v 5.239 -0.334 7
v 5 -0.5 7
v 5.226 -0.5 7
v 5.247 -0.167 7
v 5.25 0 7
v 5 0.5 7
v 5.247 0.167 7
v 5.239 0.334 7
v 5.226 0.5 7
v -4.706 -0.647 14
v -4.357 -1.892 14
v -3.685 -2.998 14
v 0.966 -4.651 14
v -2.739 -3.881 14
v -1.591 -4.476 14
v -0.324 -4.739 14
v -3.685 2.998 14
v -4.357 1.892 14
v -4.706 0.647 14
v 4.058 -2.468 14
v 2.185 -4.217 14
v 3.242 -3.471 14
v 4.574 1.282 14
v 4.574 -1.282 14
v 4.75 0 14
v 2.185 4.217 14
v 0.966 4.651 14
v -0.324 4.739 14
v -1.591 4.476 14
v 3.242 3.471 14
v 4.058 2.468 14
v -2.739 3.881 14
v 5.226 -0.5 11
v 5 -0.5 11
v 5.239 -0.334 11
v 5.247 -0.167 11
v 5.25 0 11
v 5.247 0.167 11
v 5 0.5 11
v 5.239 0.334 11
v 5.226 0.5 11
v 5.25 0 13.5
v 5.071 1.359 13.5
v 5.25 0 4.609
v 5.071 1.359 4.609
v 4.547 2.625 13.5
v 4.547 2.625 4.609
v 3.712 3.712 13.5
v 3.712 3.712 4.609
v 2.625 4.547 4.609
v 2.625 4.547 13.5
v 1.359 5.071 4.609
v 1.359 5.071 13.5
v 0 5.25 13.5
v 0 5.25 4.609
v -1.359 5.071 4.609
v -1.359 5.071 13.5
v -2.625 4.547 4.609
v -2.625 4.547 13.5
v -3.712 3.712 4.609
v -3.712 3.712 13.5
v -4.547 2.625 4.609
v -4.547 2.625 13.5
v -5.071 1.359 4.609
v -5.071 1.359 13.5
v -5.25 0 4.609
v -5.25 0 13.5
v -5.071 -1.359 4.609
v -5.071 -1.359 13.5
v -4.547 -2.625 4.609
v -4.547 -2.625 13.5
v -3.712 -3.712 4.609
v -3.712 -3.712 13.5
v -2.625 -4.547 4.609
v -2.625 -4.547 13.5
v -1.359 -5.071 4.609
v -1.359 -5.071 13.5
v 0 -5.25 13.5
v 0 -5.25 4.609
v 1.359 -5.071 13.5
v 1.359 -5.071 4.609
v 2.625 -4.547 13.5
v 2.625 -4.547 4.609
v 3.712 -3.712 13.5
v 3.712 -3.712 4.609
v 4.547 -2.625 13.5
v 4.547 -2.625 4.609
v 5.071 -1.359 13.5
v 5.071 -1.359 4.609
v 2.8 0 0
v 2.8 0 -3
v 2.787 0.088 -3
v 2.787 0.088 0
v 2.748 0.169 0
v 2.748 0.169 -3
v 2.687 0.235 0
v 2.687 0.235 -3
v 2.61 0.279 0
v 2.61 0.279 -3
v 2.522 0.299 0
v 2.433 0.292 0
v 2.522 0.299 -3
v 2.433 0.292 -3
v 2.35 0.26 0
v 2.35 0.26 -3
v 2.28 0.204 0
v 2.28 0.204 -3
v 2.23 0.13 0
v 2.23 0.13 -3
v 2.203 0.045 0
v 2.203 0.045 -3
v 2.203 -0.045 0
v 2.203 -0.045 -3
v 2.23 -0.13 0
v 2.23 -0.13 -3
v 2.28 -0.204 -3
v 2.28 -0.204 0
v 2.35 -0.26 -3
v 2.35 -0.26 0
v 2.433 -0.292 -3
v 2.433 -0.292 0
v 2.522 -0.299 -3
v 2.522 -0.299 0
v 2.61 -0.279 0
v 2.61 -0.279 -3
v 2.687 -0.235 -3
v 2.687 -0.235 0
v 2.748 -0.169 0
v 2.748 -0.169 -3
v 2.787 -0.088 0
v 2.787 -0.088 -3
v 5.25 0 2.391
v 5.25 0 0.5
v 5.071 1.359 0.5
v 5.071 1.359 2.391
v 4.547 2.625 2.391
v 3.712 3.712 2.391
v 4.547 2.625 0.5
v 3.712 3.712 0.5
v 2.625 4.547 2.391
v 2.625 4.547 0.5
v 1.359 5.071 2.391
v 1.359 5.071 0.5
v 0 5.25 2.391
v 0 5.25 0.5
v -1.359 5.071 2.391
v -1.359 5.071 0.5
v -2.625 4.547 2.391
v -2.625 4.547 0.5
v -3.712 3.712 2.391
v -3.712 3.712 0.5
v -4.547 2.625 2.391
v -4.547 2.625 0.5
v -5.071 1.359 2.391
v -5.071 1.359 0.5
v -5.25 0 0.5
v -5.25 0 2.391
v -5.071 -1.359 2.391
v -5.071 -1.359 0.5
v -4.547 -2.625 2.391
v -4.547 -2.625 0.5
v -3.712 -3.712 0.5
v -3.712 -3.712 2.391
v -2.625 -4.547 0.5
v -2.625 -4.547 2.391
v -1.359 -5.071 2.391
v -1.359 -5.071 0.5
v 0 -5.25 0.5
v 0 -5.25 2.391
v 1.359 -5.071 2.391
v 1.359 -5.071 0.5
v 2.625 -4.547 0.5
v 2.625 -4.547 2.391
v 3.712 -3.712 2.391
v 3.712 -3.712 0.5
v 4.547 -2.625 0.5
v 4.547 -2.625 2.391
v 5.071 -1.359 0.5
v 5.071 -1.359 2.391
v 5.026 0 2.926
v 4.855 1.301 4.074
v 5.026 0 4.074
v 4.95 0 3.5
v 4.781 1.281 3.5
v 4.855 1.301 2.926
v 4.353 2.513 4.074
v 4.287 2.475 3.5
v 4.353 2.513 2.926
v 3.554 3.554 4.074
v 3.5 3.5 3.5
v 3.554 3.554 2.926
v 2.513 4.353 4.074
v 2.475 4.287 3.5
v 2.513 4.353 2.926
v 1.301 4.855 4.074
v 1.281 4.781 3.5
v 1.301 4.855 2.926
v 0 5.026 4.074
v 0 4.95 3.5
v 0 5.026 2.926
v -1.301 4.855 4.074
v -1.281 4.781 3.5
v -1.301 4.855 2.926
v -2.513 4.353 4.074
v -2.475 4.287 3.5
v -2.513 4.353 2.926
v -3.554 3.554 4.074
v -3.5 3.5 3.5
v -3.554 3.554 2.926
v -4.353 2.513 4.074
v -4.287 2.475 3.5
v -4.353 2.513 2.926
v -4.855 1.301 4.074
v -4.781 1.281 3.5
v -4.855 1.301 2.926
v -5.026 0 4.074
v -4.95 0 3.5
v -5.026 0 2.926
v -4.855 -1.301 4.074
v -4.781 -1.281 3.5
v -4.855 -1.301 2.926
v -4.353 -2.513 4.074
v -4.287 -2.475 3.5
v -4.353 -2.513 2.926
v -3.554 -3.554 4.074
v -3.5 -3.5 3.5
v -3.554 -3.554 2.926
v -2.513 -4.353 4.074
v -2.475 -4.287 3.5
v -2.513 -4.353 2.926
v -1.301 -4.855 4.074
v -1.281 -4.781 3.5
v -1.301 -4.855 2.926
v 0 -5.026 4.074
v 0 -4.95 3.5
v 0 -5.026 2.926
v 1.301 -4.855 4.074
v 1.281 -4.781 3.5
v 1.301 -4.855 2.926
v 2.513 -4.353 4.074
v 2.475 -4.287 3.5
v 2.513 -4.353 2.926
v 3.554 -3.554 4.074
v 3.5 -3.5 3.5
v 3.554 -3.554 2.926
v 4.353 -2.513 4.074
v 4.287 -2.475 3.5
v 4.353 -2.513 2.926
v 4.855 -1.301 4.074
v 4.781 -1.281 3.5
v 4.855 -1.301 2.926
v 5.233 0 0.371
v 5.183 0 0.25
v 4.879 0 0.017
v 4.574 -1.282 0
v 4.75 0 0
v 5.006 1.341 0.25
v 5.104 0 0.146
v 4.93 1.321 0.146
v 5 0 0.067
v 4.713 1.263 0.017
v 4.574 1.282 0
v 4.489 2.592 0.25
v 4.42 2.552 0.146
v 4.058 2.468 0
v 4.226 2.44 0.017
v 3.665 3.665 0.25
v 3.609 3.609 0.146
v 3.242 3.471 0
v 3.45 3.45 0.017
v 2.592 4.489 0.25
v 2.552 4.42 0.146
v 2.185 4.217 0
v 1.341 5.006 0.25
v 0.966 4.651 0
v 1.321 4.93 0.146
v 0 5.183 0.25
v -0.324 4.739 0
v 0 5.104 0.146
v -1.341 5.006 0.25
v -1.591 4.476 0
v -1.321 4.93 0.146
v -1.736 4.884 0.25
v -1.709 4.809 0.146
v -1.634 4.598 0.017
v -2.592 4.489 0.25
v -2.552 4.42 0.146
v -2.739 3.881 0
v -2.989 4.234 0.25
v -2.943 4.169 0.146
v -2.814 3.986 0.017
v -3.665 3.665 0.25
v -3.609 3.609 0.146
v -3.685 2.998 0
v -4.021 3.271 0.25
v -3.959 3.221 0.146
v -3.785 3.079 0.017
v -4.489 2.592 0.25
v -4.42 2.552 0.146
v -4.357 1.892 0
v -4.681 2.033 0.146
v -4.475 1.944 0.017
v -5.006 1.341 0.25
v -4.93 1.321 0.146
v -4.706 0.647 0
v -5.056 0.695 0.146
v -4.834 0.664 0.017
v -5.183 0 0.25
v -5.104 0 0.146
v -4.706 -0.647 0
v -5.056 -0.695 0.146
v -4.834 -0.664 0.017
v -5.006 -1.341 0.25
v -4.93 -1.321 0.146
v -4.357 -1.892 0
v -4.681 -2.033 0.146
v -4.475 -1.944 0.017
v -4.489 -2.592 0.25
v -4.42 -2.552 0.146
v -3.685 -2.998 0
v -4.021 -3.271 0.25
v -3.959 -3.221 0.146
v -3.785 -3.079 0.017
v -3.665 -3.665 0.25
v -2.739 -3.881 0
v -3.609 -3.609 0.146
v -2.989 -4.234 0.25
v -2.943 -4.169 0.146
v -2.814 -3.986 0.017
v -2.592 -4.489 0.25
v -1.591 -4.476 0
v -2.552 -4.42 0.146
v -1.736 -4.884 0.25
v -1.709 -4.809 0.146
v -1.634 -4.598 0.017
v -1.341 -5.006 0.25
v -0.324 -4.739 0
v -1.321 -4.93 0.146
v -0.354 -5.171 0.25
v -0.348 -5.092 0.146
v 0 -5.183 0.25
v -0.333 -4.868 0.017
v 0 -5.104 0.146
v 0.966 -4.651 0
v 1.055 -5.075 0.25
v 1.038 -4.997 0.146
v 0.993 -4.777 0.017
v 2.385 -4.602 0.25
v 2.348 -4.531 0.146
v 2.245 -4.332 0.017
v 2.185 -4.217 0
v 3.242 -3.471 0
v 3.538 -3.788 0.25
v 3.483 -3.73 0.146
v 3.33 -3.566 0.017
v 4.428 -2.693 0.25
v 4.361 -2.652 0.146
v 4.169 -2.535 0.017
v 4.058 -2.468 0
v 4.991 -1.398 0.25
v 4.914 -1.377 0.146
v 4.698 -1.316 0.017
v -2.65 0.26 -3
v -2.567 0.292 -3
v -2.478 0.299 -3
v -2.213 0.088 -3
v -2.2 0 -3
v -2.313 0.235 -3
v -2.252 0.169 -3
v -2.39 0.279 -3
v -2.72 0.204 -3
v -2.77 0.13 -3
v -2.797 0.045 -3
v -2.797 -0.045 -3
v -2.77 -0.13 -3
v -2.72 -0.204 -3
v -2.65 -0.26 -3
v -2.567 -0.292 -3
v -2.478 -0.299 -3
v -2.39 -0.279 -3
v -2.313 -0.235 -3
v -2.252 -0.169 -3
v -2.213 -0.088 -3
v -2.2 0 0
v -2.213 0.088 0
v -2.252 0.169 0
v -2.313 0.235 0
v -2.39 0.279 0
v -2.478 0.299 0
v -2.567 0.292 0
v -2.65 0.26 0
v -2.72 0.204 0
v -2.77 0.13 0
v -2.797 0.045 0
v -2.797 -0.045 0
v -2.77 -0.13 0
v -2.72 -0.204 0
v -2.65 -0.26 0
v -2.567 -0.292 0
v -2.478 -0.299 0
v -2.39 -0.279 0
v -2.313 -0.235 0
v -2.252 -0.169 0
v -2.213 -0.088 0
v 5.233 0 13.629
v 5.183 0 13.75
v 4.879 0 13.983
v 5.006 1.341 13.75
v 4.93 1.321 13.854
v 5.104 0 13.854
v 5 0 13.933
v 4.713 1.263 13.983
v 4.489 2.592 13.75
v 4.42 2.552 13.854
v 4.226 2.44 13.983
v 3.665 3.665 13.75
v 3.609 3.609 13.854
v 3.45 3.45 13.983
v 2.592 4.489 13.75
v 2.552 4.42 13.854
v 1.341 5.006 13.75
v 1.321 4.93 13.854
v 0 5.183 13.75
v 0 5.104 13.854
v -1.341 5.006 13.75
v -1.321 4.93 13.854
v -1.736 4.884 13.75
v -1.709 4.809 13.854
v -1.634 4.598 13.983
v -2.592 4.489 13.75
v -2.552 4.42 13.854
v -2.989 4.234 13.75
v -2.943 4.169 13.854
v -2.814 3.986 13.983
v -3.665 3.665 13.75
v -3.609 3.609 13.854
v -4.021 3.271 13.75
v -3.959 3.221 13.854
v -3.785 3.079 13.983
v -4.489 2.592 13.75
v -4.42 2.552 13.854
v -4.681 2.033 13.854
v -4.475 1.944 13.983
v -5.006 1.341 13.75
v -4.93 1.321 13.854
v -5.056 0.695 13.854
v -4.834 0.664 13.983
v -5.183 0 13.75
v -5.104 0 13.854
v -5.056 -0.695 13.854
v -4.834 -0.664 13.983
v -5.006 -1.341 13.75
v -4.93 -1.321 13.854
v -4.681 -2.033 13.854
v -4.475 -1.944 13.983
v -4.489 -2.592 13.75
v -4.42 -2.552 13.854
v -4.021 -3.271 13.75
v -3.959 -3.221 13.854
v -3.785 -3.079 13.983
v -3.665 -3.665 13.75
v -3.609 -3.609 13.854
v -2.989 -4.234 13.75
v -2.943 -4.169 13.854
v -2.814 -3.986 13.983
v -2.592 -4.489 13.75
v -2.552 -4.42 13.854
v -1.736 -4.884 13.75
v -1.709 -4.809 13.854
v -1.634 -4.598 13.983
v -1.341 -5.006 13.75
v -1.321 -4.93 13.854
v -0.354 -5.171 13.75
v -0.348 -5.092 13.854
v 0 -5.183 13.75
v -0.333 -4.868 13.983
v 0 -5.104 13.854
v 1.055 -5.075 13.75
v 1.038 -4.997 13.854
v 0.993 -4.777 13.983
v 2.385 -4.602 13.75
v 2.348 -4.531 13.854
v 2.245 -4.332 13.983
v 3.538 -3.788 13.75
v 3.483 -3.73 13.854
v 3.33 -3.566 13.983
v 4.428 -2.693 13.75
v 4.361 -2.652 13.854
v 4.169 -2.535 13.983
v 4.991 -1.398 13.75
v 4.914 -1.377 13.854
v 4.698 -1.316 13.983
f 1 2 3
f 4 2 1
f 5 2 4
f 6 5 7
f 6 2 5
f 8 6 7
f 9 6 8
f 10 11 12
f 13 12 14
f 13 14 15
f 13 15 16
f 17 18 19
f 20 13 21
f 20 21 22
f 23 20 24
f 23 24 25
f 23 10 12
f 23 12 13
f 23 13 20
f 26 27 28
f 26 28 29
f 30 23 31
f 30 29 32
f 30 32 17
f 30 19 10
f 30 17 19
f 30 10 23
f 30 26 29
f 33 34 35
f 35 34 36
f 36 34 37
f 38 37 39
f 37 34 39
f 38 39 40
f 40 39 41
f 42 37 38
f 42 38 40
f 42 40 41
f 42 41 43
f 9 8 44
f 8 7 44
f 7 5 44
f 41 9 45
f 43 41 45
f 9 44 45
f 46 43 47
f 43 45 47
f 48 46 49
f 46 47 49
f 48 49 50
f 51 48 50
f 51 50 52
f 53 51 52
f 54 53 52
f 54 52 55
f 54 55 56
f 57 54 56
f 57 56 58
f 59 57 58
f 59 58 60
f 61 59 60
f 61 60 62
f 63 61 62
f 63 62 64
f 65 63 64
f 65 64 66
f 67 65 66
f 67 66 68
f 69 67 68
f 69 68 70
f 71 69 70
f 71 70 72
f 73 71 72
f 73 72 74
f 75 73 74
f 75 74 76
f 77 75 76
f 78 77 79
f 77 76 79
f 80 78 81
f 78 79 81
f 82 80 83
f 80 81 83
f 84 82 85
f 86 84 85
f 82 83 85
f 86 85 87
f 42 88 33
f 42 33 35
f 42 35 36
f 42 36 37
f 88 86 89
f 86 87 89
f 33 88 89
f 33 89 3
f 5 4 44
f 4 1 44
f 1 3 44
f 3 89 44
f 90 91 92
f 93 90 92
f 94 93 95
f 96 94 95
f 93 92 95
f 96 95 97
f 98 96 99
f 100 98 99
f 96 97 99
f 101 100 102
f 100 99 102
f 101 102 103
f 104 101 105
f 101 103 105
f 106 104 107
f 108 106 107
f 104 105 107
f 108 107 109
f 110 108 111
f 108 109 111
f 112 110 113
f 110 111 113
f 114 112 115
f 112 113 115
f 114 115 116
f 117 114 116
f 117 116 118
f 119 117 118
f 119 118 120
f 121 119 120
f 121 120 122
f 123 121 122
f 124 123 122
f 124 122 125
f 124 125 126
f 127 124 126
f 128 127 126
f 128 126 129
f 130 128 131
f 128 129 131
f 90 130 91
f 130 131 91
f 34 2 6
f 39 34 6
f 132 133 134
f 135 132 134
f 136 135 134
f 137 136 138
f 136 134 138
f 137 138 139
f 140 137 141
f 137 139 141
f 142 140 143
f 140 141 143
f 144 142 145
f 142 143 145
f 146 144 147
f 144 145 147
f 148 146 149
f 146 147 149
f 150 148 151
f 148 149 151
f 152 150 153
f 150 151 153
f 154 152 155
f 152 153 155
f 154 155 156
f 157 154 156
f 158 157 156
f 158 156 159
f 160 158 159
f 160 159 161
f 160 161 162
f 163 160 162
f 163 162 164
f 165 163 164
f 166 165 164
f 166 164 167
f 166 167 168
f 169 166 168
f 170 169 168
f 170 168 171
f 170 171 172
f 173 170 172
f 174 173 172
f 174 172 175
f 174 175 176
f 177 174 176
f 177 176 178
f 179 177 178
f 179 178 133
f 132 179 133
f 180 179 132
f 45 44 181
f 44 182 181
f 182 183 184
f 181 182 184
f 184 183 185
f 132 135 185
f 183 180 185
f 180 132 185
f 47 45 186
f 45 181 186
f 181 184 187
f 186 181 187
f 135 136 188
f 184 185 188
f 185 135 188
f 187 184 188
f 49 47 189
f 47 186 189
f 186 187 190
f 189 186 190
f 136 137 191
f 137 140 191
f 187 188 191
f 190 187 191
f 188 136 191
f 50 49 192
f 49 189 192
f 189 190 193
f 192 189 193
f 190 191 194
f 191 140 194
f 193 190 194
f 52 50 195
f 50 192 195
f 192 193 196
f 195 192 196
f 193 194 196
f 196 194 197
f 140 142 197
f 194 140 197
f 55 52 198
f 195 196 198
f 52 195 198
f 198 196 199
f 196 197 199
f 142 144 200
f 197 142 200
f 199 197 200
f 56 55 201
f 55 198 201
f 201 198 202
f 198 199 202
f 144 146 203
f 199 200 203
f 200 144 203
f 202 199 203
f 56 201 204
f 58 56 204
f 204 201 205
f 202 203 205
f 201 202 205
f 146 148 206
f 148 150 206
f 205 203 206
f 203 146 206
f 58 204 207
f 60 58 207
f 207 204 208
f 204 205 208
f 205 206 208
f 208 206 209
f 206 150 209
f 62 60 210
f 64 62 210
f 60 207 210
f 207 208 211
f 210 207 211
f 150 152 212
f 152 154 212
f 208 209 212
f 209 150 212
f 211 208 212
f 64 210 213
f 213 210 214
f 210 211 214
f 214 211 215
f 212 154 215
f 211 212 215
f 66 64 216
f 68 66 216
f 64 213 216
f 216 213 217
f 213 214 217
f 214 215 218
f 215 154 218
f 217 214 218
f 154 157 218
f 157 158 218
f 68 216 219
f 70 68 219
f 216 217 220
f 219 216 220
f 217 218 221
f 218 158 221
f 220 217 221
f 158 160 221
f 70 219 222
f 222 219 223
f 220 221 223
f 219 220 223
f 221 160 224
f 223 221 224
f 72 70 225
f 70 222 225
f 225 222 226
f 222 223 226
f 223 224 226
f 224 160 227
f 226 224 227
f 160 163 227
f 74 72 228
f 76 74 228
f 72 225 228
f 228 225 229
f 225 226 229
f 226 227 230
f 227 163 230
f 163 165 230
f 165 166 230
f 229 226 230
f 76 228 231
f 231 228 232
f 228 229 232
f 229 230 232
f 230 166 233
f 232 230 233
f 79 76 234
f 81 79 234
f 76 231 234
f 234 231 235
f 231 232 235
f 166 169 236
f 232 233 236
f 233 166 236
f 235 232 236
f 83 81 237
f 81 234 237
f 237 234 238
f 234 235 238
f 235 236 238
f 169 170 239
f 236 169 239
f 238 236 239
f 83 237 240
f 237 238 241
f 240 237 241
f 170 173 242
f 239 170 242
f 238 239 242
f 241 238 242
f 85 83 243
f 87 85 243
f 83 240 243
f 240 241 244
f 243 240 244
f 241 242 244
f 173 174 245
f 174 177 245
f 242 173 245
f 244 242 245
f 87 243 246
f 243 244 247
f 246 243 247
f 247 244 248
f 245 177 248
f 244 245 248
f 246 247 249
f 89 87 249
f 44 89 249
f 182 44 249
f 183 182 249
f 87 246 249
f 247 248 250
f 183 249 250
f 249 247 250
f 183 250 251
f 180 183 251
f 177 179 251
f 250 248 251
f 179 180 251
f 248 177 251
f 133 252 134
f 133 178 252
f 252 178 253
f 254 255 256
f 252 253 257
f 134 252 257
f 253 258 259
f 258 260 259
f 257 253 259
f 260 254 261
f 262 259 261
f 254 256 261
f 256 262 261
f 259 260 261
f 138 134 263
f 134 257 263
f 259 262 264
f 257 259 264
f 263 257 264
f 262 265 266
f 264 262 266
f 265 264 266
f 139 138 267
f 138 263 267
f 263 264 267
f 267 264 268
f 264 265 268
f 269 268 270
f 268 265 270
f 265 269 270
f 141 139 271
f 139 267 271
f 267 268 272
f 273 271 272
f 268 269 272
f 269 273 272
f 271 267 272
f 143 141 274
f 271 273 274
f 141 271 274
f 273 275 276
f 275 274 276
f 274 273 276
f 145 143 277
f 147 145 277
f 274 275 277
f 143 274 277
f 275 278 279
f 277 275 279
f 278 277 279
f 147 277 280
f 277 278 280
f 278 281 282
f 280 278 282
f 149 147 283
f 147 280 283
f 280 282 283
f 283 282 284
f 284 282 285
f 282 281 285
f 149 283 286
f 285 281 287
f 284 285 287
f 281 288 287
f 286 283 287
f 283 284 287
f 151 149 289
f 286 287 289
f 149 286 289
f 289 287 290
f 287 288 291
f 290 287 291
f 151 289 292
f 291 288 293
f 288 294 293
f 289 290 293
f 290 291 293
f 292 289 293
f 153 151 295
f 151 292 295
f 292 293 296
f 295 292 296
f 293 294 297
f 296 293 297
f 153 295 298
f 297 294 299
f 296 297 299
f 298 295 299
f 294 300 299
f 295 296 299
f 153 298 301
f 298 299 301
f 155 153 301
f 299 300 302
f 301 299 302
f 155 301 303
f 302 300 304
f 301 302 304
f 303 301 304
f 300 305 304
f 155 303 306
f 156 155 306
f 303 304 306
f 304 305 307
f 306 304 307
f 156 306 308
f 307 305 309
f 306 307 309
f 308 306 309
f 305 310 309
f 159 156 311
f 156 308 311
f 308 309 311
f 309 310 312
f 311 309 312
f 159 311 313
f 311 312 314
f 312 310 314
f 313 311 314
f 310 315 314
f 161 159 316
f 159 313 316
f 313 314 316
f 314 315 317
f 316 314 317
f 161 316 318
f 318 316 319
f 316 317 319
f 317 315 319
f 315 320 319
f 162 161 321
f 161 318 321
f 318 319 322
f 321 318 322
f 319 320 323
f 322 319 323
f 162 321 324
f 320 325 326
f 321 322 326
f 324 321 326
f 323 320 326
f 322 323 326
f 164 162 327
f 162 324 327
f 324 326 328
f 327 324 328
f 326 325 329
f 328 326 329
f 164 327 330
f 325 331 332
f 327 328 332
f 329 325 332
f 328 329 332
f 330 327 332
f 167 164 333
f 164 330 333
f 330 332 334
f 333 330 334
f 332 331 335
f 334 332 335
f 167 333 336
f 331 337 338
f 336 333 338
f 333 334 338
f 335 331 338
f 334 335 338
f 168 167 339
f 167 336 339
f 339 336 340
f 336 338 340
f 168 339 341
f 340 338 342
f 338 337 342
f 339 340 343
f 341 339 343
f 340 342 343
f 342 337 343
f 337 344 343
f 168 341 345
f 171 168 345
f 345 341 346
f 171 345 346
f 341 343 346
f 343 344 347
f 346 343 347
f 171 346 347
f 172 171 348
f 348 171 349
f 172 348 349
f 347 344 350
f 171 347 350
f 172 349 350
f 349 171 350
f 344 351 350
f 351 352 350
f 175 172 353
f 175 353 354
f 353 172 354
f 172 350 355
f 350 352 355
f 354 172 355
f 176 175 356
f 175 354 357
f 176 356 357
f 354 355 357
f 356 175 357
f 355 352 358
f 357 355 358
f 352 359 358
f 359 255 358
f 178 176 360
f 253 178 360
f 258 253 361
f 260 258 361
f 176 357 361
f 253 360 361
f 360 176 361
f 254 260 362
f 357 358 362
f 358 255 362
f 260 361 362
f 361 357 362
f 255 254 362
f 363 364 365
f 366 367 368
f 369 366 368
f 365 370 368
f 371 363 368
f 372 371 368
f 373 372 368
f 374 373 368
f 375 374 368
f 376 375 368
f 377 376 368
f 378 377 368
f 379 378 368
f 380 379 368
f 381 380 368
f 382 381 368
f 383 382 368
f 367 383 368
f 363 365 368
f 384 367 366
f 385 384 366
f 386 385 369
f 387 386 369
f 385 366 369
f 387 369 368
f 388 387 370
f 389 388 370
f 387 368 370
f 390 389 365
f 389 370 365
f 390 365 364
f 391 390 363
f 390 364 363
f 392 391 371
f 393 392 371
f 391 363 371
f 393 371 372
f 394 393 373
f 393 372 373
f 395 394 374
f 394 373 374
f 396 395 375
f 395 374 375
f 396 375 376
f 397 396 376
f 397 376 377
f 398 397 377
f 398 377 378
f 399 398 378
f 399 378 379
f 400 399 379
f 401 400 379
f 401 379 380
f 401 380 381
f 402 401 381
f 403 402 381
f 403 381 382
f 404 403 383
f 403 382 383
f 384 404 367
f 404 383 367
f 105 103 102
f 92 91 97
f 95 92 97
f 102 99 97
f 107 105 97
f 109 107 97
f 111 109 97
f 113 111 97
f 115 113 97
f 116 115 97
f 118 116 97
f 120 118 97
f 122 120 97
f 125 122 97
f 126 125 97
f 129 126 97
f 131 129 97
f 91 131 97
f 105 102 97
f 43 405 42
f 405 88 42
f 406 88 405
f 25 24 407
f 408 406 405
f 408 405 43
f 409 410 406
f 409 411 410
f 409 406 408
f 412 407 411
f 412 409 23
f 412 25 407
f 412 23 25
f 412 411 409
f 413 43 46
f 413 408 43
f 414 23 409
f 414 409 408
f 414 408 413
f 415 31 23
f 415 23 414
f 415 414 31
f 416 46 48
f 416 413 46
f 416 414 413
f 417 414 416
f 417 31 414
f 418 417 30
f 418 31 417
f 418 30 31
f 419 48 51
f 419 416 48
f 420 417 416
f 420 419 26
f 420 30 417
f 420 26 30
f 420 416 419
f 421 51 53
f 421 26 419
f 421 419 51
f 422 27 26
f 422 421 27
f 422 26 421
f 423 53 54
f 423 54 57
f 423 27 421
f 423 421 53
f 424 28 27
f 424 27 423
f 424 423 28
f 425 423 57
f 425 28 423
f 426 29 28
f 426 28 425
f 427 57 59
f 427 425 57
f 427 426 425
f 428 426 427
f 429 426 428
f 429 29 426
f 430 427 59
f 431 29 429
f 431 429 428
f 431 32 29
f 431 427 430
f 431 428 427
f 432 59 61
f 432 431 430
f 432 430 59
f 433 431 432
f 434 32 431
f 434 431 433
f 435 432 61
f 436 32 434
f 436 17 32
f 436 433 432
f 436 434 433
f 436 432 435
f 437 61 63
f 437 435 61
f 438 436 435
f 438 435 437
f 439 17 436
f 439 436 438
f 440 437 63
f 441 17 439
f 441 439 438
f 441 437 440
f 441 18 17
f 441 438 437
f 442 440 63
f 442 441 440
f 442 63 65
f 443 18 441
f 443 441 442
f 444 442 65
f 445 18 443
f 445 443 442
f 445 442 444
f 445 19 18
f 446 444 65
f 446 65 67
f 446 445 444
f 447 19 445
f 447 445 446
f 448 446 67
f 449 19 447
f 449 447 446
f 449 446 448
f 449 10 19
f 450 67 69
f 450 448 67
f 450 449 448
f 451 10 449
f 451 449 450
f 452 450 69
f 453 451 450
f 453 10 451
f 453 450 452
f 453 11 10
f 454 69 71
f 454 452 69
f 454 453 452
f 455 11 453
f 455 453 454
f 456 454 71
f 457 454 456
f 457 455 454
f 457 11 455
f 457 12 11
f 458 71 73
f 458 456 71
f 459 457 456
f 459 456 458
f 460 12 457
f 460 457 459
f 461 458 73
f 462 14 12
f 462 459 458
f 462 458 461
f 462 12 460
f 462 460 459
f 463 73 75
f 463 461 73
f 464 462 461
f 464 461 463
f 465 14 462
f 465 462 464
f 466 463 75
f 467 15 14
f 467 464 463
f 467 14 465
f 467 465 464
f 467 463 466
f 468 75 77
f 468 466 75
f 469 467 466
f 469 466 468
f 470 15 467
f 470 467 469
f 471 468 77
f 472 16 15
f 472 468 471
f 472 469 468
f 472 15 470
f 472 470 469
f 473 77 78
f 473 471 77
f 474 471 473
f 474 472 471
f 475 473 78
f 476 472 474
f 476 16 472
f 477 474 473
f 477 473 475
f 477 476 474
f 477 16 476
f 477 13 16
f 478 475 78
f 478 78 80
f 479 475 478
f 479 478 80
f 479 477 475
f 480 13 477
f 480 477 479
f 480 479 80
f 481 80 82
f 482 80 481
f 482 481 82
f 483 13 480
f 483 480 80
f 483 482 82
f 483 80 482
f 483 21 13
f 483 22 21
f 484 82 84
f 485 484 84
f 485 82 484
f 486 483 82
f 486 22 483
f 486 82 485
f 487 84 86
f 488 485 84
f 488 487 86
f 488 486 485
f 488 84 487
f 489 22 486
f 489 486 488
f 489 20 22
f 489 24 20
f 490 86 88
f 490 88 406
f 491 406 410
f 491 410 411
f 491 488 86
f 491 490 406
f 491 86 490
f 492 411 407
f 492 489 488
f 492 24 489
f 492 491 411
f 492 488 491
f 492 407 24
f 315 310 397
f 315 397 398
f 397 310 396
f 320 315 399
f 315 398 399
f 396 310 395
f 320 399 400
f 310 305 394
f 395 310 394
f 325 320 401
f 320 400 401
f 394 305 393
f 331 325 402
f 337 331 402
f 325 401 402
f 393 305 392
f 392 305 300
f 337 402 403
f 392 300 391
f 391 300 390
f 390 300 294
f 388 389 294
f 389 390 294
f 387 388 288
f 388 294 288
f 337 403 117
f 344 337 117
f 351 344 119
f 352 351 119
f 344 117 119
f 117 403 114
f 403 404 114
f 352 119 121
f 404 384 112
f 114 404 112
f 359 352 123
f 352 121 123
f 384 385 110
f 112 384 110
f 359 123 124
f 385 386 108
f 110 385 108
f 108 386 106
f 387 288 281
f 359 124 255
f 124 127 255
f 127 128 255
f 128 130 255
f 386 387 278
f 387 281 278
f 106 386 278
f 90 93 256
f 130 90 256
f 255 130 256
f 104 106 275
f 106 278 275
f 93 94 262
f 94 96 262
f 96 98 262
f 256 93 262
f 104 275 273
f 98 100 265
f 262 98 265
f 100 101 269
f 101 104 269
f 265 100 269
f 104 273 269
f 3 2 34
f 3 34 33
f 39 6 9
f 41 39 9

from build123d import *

# Parameters (mm, degrees)
CYLINDER002_R     = 0.3
CYLINDER002_DEPTH = 3
CYLINDER001_R     = 0.3
CYLINDER001_DEPTH = 3
BOX001_W          = 1
BOX001_H          = 1
BOX001_DEPTH      = 4
BOX_W             = 1
BOX_H             = 1
BOX_DEPTH         = 4
TORUS_R           = 2.2
CYLINDER_R        = 5.25
CYLINDER_DEPTH    = 14
FILLET_R          = 0.5


with BuildPart() as pin2:
    # Cylinder002 → Cylinder002 (new body)
    with BuildSketch(Plane(origin=(2.5, 0, -3), x_dir=(1, 0, 0), z_dir=(0, 0, 1))):
        Circle(CYLINDER002_R)
    extrude(amount=CYLINDER002_DEPTH)


with BuildPart() as pin1:
    # Cylinder001 → Cylinder001 (new body)
    with BuildSketch(Plane(origin=(-2.5, 0, -3), x_dir=(1, 0, 0), z_dir=(0, 0, 1))):
        Circle(CYLINDER001_R)
    extrude(amount=CYLINDER001_DEPTH)


with BuildPart() as box001:
    # Box001 → Box001 (new body)
    with BuildSketch(Plane(origin=(5, -0.5, 15), x_dir=(1, 0, 0), z_dir=(0, 0, 1))):
        with Locations((0.5, 0.5)):
            Rectangle(BOX001_W, BOX001_H)
    extrude(amount=BOX001_DEPTH)


with BuildPart() as box:
    # Box → Box (new body)
    with BuildSketch(Plane(origin=(5, -0.5, 7), x_dir=(1, 0, 0), z_dir=(0, 0, 1))):
        with Locations((0.5, 0.5)):
            Rectangle(BOX_W, BOX_H)
    extrude(amount=BOX_DEPTH)


with BuildPart() as ring:
    # Torus → Torus (revolve)
    with BuildSketch(Plane(origin=(0, 0, 3.5), x_dir=(1, 0, 0), z_dir=(0, -1, 0))):
        with Locations((7.15, 0)):
            Circle(TORUS_R)
    revolve(axis=Axis((0, 0, 3.5), (0, 0, 1)))


with BuildPart() as cappr500w60d1000h1250:
    # Cylinder → Cylinder (new body)
    with BuildSketch(Plane.XY):
        Circle(CYLINDER_R)
    extrude(amount=CYLINDER_DEPTH)

    # Fillet
    fillet_edges = [cappr500w60d1000h1250.edges().sort_by_distance(p)[0] for p in [
        (-5.25, 0, 14),
        (-5.25, 0, 0),
    ]]
    fillet(fillet_edges, radius=FILLET_R)

    # Cut: cut Ring
    add(ring.part, mode=Mode.SUBTRACT)

    # Cut001: cut Box
    add(box.part, mode=Mode.SUBTRACT)

    # Cut002: cut Box001
    add(box001.part, mode=Mode.SUBTRACT)

    # Fusion: union Pin1+
    add(pin1.part)

    # Fusion001: union Pin2-
    add(pin2.part)


solid = cappr500w60d1000h1250.part
